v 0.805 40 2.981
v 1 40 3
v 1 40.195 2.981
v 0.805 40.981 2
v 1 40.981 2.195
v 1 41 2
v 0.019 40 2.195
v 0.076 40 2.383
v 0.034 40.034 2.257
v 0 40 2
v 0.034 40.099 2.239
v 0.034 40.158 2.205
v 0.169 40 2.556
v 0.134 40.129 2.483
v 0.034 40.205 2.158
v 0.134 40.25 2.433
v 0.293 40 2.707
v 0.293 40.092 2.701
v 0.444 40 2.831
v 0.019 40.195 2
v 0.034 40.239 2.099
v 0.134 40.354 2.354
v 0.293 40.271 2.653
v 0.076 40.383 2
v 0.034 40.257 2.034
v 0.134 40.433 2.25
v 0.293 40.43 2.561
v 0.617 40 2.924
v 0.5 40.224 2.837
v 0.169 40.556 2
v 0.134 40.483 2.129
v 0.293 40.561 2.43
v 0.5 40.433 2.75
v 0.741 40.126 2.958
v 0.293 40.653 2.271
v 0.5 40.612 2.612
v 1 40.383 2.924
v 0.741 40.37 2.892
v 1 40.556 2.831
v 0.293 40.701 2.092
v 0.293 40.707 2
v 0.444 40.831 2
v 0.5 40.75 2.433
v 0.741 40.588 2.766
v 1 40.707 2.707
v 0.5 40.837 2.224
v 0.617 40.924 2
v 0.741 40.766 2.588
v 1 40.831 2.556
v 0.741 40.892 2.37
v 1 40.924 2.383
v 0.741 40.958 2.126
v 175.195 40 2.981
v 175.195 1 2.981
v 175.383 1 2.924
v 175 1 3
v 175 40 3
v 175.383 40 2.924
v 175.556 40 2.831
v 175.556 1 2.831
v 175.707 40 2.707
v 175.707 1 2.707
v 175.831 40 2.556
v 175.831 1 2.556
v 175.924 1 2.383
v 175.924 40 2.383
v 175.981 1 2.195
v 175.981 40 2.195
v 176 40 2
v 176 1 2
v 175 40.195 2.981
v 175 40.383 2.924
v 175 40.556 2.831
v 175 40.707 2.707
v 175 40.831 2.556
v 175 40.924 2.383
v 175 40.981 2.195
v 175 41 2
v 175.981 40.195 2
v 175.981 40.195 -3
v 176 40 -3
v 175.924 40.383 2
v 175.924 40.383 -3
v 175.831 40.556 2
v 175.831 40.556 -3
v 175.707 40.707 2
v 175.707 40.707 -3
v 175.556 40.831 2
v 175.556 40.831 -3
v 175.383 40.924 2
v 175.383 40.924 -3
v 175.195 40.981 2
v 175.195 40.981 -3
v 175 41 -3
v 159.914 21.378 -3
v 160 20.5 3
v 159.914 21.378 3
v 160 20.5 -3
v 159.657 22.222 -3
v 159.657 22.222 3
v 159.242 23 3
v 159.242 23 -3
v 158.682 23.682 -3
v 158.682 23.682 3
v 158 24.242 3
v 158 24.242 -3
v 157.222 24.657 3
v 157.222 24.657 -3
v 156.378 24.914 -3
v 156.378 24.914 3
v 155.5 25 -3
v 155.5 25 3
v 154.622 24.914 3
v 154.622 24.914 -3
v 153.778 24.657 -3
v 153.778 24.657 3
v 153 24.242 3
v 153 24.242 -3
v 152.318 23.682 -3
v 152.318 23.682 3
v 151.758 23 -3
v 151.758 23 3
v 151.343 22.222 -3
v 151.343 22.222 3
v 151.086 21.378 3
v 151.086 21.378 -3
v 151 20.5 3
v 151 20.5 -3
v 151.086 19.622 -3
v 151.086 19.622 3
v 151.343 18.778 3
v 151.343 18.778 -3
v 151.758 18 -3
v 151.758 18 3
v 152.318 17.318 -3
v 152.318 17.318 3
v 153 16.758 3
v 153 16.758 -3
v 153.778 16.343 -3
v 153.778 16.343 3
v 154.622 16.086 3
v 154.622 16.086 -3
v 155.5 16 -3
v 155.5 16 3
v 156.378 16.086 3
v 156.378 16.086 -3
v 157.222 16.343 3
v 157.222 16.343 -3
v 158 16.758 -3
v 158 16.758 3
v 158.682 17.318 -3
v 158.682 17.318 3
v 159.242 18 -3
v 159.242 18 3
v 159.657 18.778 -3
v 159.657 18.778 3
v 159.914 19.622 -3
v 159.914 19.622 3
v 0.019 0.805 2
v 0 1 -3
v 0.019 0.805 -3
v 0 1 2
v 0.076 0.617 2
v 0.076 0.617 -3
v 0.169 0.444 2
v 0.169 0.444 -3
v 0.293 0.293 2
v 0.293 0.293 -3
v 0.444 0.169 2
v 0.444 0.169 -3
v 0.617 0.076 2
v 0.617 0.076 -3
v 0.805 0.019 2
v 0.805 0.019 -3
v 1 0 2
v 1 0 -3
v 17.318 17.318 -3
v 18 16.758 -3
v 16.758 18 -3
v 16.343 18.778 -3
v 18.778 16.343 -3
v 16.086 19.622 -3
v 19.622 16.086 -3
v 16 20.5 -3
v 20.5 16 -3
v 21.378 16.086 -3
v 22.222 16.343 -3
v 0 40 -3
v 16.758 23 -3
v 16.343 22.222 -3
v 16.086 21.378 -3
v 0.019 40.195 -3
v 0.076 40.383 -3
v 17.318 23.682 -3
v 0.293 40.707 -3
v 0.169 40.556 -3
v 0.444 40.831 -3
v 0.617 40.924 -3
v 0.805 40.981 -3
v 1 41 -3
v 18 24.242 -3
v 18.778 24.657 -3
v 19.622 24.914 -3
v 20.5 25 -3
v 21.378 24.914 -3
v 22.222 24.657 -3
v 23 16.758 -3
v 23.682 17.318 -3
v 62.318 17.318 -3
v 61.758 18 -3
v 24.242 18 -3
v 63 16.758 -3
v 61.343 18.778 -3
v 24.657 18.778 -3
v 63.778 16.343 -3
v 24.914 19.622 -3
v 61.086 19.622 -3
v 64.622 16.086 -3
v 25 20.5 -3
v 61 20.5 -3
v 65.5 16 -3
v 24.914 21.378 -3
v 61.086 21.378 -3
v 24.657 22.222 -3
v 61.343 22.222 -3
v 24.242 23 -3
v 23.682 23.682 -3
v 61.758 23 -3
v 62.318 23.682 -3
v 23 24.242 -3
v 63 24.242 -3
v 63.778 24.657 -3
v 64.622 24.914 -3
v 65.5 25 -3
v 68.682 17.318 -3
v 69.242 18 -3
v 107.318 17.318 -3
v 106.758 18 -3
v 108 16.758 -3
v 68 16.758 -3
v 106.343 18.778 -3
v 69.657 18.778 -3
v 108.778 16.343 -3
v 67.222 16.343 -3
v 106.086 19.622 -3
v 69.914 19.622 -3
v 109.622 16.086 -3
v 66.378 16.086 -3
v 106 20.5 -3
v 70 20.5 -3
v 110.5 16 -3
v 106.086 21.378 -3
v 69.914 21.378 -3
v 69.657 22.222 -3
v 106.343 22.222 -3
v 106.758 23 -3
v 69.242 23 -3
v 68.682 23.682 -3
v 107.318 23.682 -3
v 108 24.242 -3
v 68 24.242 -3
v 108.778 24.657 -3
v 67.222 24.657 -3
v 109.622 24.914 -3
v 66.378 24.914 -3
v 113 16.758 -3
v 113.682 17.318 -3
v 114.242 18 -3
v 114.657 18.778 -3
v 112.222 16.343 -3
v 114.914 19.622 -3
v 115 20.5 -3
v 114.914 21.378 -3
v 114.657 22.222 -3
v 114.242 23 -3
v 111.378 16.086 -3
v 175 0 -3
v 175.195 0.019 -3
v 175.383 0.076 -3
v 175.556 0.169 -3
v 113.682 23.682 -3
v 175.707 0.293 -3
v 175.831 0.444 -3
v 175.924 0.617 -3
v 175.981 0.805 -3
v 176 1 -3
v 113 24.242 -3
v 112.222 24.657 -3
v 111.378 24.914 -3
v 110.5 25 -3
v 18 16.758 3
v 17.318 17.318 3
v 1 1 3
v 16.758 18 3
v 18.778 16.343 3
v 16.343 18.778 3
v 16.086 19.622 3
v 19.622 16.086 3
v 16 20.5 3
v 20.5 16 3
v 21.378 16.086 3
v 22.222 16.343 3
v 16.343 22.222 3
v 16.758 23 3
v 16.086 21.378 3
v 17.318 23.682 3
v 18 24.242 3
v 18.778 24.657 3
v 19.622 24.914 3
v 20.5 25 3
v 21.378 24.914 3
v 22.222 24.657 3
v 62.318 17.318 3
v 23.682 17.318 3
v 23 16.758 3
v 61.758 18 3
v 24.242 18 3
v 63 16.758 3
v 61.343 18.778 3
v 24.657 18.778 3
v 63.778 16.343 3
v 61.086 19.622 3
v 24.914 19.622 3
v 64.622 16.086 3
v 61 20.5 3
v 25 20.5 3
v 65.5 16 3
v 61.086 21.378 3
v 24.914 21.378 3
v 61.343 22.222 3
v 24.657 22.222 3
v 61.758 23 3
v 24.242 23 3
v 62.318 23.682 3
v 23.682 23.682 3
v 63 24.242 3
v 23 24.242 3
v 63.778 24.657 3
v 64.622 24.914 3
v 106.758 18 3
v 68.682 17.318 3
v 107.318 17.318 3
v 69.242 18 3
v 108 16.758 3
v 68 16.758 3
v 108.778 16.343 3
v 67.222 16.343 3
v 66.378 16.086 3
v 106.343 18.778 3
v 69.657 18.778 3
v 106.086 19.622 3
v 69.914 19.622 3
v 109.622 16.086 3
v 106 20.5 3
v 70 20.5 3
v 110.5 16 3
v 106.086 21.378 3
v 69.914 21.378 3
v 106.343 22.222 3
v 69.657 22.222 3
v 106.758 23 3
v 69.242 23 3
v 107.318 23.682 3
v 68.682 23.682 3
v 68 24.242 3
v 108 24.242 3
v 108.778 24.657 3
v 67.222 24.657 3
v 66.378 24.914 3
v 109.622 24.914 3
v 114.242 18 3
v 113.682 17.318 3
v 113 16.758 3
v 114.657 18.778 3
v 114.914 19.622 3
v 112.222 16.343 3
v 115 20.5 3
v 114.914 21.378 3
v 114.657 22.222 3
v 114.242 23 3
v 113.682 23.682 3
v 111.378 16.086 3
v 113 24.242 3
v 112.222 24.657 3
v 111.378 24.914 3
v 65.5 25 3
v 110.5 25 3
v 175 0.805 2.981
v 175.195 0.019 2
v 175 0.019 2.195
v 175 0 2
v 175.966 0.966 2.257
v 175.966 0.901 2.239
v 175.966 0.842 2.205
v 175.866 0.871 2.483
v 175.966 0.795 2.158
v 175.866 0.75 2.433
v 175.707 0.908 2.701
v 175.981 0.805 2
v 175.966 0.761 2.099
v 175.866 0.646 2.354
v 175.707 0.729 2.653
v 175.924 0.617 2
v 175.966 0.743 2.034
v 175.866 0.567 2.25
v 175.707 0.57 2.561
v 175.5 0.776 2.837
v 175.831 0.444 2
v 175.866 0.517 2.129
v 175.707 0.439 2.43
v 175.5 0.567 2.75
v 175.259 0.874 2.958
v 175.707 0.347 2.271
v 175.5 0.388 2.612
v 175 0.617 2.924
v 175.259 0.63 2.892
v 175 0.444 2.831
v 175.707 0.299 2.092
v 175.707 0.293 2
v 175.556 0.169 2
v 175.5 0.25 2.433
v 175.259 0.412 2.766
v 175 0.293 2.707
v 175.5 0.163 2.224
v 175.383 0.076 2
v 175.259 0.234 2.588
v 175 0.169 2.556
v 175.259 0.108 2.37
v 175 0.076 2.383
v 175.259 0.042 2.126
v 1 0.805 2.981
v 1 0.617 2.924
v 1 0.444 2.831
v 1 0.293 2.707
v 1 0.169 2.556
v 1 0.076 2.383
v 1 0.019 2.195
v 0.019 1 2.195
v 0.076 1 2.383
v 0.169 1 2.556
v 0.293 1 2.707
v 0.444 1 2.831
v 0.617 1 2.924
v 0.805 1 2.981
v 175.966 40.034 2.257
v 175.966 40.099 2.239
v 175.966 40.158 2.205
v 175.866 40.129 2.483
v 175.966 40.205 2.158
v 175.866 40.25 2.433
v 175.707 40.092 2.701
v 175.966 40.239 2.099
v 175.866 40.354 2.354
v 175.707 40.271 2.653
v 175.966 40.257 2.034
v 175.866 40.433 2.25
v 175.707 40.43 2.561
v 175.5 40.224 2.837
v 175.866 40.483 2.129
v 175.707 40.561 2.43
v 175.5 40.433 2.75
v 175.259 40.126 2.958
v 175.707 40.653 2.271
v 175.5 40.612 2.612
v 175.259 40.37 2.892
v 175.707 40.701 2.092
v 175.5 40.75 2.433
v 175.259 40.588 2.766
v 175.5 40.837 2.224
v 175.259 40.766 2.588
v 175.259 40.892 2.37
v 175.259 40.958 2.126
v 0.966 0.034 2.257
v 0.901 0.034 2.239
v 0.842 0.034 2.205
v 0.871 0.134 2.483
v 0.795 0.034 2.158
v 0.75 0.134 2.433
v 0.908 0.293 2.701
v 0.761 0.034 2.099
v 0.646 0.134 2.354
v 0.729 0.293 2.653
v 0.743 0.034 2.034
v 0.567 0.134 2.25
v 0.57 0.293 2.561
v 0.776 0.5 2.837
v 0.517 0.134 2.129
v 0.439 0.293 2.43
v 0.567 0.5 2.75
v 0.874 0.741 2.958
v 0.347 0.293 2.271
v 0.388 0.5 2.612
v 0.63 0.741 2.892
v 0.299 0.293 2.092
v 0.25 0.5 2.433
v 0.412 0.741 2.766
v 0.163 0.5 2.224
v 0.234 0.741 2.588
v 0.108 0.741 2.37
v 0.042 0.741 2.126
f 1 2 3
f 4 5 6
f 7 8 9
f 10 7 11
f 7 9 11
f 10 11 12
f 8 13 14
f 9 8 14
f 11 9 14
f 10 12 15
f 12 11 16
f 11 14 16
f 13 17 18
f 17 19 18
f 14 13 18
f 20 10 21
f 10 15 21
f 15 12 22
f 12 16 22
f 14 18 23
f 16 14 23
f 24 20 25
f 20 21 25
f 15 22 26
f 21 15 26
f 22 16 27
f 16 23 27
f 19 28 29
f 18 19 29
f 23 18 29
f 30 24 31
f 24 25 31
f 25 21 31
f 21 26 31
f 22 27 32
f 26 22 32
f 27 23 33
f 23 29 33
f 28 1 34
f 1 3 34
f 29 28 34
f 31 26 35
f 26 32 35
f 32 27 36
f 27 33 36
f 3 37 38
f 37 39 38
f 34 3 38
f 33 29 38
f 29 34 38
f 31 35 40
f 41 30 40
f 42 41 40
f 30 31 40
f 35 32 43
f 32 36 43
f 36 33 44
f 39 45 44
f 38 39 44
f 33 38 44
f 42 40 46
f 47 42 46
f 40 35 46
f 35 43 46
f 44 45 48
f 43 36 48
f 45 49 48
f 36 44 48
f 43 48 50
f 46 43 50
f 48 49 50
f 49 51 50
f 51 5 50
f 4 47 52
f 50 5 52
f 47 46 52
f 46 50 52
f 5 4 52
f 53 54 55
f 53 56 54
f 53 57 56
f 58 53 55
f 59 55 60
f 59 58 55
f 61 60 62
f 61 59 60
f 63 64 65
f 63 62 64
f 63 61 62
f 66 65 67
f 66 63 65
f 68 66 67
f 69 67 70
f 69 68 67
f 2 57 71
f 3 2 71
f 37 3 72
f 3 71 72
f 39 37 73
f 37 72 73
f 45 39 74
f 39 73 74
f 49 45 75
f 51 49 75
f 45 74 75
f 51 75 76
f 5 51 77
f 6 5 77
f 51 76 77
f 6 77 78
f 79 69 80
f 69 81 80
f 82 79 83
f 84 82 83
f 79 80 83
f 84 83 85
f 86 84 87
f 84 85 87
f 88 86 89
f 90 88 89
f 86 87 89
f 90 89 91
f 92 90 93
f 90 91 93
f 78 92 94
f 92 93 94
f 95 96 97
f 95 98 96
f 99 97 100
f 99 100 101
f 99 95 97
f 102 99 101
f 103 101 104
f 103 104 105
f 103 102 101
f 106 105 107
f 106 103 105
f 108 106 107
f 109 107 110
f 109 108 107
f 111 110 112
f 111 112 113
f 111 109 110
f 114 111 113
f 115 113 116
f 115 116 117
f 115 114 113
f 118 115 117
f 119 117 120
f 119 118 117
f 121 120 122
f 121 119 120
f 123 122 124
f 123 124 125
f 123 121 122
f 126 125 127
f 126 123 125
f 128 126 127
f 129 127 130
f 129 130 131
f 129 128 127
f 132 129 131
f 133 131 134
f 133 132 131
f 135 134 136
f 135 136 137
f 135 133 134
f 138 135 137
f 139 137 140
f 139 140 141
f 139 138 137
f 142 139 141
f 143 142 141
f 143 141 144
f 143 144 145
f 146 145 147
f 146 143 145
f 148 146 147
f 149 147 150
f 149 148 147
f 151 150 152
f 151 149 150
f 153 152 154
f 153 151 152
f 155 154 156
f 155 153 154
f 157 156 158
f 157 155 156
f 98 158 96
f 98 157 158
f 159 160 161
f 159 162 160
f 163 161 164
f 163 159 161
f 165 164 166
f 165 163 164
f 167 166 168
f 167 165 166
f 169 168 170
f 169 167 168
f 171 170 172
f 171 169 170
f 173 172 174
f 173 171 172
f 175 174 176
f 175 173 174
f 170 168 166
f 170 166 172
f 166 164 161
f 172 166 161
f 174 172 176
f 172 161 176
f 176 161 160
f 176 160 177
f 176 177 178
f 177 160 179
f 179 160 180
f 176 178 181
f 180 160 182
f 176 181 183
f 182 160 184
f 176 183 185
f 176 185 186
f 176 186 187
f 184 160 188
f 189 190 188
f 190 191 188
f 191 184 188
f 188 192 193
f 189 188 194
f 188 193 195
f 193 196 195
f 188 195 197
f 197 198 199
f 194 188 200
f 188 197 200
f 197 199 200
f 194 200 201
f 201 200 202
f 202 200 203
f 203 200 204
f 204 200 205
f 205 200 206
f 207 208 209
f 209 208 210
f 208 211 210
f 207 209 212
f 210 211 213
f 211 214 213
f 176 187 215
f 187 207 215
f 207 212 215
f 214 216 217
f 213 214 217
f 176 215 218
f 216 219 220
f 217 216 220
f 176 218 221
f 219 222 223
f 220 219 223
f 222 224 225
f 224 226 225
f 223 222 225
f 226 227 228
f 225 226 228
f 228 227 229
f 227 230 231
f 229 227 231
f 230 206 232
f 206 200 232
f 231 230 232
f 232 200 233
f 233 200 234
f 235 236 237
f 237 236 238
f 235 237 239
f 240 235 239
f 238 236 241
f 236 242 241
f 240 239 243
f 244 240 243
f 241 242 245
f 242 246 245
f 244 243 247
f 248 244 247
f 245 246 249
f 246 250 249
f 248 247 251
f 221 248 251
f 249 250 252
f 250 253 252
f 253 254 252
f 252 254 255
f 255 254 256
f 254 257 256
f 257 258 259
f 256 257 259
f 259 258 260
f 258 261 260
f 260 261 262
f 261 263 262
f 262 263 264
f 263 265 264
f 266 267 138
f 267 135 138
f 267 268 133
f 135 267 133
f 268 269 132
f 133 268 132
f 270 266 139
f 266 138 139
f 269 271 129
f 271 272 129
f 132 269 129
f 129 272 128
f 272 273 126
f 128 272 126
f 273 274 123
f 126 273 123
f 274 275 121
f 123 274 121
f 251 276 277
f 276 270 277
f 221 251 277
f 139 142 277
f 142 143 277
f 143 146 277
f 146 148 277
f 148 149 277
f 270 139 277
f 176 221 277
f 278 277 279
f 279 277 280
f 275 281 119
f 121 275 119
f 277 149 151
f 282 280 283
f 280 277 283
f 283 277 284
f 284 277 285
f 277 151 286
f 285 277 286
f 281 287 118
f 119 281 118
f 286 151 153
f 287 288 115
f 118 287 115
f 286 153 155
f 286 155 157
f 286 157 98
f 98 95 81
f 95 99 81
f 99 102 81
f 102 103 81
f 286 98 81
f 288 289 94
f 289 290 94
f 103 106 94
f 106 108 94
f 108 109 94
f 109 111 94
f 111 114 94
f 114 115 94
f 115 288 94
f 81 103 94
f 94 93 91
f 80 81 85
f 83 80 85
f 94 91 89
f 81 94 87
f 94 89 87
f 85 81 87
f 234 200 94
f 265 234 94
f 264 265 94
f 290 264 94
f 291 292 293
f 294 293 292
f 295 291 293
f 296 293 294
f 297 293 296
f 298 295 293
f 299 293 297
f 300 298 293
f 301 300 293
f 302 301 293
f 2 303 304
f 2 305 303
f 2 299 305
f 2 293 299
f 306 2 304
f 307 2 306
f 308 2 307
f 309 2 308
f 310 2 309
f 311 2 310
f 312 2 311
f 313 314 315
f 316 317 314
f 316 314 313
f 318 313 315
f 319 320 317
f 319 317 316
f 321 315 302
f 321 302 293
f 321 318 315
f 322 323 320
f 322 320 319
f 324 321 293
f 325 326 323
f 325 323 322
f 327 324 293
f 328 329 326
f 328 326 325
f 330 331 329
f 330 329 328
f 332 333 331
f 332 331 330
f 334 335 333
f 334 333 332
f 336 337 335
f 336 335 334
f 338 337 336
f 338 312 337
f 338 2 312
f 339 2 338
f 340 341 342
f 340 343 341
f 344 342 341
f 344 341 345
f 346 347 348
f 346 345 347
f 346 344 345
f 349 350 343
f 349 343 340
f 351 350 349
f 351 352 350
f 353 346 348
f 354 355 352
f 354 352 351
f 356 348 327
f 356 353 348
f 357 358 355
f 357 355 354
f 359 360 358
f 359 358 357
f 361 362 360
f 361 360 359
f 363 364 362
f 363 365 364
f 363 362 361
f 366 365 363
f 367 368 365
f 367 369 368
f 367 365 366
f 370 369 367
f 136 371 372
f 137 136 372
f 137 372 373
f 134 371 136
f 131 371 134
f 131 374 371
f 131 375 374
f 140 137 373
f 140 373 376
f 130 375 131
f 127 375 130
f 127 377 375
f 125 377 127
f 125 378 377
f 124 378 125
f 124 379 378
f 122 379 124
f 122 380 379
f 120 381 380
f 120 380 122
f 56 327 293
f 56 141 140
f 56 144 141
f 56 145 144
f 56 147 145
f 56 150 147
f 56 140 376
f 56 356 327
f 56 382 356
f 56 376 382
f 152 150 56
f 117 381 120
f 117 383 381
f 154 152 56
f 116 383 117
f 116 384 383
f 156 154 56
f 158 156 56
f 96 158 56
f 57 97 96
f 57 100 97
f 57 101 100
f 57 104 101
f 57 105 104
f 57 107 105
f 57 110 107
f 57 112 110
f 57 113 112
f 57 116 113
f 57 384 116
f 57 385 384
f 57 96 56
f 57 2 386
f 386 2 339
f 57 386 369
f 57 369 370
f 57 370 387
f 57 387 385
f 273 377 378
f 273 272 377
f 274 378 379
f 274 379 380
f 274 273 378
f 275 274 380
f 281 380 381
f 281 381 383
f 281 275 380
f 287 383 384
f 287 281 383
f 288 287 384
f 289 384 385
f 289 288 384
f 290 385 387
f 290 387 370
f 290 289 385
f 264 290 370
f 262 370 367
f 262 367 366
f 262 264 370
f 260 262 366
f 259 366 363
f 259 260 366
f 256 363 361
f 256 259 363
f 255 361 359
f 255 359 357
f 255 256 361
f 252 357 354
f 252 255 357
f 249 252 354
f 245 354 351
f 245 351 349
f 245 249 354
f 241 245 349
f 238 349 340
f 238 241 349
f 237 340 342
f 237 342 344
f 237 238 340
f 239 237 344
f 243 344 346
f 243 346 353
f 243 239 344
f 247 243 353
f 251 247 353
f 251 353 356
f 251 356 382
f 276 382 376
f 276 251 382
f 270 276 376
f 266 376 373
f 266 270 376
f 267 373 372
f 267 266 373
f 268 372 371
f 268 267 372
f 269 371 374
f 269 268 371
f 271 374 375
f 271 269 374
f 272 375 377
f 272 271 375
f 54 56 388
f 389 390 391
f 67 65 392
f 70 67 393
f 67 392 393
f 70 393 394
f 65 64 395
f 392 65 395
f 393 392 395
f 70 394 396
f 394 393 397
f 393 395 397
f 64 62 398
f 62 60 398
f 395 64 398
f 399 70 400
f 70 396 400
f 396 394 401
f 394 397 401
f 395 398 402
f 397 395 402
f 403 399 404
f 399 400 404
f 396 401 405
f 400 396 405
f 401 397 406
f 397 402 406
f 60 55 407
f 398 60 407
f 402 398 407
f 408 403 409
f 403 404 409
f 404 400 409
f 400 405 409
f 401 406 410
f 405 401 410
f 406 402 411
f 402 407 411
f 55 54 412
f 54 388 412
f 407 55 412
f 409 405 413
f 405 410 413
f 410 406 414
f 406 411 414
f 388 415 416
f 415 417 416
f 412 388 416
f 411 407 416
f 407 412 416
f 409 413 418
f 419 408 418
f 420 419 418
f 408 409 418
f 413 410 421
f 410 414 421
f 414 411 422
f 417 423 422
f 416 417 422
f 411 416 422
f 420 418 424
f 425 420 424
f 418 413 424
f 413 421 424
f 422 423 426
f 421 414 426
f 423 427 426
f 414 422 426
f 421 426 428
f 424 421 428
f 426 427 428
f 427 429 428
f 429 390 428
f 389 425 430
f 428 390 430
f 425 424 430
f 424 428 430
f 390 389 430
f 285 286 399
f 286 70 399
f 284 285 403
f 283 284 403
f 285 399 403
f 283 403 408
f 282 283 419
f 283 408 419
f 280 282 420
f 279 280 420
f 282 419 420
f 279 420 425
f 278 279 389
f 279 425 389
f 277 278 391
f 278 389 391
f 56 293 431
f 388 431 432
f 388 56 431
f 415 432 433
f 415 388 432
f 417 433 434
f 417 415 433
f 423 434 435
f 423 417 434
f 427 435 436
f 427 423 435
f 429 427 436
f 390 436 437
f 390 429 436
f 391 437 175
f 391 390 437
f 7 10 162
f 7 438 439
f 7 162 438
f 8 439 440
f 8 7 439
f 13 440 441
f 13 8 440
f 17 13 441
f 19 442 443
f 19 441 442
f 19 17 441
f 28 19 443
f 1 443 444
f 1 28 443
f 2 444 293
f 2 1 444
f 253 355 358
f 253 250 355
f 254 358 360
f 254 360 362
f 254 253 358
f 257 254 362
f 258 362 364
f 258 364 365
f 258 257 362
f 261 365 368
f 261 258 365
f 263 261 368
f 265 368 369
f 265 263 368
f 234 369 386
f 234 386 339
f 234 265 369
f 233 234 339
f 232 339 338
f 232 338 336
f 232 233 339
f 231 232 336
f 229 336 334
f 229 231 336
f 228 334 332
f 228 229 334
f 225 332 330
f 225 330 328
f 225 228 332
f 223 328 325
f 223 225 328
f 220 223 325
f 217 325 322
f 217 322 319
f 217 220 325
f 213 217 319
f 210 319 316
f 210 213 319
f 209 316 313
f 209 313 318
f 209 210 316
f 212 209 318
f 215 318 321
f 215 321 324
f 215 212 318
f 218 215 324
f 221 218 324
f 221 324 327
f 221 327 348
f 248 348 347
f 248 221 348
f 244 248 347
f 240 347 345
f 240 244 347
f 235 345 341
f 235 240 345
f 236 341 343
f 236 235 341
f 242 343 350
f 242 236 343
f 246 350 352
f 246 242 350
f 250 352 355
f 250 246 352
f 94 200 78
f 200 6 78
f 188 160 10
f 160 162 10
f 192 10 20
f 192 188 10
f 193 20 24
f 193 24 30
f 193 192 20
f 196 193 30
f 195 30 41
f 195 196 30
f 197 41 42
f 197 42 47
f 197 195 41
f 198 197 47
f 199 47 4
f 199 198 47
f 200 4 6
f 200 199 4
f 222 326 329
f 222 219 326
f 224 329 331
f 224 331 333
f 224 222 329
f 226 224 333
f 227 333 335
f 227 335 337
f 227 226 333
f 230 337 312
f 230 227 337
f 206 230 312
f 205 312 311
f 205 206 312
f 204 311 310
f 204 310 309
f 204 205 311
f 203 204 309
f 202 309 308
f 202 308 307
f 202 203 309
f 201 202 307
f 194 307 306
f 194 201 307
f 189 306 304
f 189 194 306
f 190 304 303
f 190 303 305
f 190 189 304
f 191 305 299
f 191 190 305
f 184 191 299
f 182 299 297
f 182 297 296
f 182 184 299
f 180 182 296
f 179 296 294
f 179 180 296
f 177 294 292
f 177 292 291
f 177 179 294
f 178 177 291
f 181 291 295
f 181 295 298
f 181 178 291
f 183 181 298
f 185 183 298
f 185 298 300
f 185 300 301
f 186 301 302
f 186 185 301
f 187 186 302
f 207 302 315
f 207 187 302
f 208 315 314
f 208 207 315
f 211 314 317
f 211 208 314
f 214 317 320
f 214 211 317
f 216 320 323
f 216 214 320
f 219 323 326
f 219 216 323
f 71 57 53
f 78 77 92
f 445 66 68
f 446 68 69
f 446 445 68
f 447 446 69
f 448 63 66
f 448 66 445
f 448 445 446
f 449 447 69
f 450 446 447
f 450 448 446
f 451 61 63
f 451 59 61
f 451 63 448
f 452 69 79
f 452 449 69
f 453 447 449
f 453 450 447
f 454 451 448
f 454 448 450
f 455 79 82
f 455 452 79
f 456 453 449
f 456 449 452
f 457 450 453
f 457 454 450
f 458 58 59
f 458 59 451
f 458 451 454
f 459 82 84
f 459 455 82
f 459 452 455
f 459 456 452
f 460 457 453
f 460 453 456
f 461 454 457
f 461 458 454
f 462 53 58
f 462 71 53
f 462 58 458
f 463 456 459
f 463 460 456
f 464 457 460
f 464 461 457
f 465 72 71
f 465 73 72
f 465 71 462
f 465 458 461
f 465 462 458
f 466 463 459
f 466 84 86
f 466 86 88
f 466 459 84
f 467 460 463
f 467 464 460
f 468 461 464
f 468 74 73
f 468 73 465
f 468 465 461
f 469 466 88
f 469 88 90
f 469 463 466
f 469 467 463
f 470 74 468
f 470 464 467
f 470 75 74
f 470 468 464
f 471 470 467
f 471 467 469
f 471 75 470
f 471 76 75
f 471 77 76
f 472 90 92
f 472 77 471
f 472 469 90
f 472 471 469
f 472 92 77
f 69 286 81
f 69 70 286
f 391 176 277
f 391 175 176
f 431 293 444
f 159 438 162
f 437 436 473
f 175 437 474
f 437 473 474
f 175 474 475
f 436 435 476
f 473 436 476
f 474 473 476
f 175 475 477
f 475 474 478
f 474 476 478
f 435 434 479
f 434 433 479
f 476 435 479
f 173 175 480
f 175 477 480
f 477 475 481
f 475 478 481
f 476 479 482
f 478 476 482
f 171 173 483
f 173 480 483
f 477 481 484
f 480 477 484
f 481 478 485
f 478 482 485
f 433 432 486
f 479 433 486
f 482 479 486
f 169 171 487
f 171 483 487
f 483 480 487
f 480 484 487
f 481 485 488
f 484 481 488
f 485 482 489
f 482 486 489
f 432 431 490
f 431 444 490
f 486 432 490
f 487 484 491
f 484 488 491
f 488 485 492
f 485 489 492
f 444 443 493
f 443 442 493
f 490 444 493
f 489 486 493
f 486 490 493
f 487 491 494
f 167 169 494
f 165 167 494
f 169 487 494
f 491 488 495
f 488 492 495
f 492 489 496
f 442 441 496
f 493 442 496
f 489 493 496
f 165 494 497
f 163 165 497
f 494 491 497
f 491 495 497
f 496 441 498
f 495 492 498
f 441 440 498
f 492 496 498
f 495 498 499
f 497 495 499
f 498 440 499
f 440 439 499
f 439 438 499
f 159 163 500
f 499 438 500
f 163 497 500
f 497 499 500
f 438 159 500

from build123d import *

# Parameters (mm, degrees)
SKETCH1_W           = 176
SKETCH1_H           = 41
SKETCH1_R           = 4.5
BOSS_EXTRUDE1_DEPTH = 3
FILLET1_R           = 1


with BuildPart() as part:
    # Sketch1 → Boss-Extrude1 (new, symmetric)
    with BuildSketch(Plane.XY):
        with Locations((88, 20.5)):
            Rectangle(SKETCH1_W, SKETCH1_H)
        with Locations((20.5, 20.5)):
            Circle(SKETCH1_R, mode=Mode.SUBTRACT)
        with Locations((65.5, 20.5)):
            Circle(SKETCH1_R, mode=Mode.SUBTRACT)
        with Locations((110.5, 20.5)):
            Circle(SKETCH1_R, mode=Mode.SUBTRACT)
        with Locations((155.5, 20.5)):
            Circle(SKETCH1_R, mode=Mode.SUBTRACT)
    extrude(amount=BOSS_EXTRUDE1_DEPTH, both=True)

    # Fillet1
    fillet1_edges = [part.edges().sort_by_distance(p)[0] for p in [
        (88, 41, 3),
        (0, 20.5, 3),
        (88, 0, 3),
        (176, 20.5, 3),
        (0, 0, 0),
        (0, 41, 0),
        (176, 41, 0),
        (176, 0, 0),
    ]]
    fillet(fillet1_edges, radius=FILLET1_R)


solid = part.part
